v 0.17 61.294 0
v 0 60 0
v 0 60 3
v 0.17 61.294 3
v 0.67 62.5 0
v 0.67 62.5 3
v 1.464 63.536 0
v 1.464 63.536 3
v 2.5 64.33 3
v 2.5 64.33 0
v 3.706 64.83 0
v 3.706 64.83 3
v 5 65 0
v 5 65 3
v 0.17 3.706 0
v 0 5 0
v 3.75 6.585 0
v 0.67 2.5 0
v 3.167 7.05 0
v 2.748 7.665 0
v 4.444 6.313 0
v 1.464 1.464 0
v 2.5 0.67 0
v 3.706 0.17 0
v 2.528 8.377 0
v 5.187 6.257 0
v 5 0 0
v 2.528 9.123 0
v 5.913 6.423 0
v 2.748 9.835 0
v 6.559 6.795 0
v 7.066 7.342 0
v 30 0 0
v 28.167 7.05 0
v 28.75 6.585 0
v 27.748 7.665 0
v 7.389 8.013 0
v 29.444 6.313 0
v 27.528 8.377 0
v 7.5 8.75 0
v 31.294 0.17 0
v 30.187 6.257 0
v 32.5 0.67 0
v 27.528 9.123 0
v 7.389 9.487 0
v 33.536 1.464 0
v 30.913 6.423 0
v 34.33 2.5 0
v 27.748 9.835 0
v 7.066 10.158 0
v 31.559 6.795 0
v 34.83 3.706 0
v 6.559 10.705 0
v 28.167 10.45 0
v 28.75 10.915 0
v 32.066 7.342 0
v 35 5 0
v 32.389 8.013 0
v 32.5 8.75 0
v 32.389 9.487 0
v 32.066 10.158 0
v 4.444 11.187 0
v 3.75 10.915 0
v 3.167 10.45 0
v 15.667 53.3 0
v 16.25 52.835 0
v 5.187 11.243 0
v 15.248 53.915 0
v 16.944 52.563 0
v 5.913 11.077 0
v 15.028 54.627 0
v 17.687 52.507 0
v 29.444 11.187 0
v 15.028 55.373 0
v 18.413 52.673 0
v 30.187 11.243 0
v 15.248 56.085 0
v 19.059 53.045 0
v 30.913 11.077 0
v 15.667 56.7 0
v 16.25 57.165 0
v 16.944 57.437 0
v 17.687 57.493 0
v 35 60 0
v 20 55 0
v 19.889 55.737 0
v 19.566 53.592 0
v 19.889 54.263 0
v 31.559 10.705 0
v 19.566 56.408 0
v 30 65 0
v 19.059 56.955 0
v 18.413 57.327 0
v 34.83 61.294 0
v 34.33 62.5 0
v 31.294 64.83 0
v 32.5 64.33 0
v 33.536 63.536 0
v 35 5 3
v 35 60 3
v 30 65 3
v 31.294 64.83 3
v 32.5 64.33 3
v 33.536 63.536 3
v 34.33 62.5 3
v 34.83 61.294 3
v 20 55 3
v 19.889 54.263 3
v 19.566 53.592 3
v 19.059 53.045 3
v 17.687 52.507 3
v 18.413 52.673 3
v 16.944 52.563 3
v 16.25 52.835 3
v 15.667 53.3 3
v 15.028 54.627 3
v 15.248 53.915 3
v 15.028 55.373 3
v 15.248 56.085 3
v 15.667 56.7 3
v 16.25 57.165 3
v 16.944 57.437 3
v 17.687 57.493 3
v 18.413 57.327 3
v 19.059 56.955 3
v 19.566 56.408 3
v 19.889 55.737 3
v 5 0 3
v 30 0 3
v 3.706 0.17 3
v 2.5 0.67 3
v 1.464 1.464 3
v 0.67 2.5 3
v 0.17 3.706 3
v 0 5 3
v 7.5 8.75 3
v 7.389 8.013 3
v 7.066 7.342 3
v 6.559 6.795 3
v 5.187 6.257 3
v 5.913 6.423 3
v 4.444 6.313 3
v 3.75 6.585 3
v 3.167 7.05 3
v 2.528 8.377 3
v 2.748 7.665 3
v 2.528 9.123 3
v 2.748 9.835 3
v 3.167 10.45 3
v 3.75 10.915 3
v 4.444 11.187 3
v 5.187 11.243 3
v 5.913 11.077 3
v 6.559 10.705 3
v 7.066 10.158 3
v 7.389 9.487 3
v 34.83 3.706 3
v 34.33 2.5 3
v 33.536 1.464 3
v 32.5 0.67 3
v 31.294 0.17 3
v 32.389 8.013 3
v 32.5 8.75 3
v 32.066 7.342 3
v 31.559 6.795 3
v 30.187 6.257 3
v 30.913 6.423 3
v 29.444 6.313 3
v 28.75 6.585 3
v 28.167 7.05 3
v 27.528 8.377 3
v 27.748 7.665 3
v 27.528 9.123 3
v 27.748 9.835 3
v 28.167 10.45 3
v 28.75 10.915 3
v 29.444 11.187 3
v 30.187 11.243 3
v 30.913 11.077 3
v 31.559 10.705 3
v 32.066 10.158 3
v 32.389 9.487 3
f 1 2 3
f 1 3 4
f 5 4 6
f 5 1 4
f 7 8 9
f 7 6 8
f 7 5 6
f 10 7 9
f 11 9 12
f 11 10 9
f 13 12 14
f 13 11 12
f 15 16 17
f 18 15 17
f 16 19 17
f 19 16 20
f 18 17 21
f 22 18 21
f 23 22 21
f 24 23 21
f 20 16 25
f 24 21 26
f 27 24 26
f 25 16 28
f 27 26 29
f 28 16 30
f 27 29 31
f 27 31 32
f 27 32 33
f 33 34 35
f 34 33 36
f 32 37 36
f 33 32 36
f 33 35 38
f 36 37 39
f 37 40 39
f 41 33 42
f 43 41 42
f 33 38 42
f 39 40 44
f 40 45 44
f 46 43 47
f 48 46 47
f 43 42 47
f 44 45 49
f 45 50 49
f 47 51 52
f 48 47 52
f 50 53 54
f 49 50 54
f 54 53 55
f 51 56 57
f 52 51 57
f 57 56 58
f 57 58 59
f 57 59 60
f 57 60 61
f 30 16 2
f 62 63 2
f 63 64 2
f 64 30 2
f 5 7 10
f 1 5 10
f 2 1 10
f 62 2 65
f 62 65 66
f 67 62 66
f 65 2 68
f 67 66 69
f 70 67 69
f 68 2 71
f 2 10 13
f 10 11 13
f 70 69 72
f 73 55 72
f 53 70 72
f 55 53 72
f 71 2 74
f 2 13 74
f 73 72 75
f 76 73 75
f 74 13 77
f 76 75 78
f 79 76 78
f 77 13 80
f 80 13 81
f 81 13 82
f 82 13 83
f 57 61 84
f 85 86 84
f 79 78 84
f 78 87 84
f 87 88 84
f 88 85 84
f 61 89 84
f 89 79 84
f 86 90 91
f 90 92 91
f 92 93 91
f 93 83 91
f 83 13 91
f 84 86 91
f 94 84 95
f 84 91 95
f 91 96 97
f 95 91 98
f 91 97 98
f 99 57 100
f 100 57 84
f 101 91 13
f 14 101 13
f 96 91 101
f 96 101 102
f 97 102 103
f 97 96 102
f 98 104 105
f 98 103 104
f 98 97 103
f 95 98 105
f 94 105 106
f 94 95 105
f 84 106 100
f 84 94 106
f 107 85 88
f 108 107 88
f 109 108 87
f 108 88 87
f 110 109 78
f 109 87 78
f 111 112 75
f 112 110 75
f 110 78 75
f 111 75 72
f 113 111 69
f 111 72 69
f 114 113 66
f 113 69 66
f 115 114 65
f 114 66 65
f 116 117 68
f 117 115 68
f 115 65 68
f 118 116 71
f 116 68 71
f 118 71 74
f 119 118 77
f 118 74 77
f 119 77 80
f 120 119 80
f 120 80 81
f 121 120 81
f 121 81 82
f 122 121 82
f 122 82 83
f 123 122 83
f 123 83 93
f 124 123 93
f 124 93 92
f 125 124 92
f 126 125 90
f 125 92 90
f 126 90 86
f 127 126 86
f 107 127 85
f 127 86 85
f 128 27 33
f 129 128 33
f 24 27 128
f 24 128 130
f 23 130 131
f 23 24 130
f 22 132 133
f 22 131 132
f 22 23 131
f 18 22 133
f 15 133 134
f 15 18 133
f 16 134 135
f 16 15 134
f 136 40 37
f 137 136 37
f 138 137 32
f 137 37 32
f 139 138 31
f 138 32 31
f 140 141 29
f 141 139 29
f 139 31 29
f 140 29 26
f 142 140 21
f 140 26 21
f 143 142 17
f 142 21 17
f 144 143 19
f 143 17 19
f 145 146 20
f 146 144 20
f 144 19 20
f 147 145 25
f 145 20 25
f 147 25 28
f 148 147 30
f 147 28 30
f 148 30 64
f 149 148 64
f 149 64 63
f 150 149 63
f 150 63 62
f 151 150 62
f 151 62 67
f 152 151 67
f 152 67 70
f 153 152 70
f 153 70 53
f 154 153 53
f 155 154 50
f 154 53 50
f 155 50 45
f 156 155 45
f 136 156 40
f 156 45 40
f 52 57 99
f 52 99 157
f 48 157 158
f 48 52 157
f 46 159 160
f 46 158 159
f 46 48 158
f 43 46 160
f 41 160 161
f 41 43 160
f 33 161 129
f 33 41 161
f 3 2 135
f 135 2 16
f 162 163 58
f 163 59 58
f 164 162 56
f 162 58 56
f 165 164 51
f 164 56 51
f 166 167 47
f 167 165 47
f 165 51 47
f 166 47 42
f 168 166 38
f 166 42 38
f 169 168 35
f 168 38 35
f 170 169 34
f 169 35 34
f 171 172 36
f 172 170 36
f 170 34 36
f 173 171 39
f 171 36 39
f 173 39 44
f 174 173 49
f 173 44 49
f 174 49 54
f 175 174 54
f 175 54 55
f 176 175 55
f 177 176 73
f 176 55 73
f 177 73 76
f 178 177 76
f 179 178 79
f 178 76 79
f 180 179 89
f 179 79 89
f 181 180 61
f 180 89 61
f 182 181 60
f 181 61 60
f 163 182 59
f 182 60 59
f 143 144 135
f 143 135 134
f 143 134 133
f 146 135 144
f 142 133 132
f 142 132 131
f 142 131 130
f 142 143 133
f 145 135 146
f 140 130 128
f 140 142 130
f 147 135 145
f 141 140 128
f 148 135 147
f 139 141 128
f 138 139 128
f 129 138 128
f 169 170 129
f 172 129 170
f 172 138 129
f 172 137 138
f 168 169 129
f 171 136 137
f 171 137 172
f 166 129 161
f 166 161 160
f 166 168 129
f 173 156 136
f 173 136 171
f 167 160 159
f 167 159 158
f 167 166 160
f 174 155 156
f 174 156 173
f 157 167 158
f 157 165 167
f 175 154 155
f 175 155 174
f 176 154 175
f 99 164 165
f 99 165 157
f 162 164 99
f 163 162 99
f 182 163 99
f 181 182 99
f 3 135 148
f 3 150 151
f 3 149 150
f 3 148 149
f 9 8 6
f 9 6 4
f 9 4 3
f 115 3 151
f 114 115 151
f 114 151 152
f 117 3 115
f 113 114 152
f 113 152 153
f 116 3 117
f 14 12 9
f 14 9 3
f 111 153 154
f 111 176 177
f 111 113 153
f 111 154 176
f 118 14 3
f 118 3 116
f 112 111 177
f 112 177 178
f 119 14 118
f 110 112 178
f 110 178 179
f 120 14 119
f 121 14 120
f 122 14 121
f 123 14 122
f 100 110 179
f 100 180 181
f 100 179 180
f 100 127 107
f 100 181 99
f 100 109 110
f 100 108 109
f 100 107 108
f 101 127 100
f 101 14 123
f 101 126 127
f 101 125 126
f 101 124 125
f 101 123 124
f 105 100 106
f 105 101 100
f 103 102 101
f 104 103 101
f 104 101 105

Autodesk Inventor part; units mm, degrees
ref_plane "YZ Plane" through (0, 0, 0) normal (1, 0, 0) x (0, 1, 0)
ref_plane "XZ Plane" through (0, 0, 0) normal (0, 1, 0) x (-1, 0, 0)
ref_plane "XY Plane" through (0, 0, 0) normal (0, 0, 1) x (1, 0, 0)
sketch "Boceto1" plane through (0, 0, 0) normal (0, 0, 1) x (1, 0, 0)
  line L0 (5, 0) -> (30, 0)
  line L1 (35, 5) -> (35, 60)
  line L2 (30, 65) -> (5, 65)
  line L3 (0, 60) -> (0, 5)
  arc A0 (5, 65) -> (0, 60) centre (5, 60) ccw
  arc A1 (35, 60) -> (30, 65) centre (30, 60) ccw
  arc A2 (0, 5) -> (5, 0) centre (5, 5) ccw
  arc A3 (30, 0) -> (35, 5) centre (30, 5) ccw
  circle A4 centre (17.5, 55) radius 2.5
  circle A5 centre (5, 8.75) radius 2.5
  circle A6 centre (30, 8.75) radius 2.5
  point P0 (0, 0)
extrude "Extrusión1" add sketch "Boceto1" along normal blind 3
properties part number "6"
